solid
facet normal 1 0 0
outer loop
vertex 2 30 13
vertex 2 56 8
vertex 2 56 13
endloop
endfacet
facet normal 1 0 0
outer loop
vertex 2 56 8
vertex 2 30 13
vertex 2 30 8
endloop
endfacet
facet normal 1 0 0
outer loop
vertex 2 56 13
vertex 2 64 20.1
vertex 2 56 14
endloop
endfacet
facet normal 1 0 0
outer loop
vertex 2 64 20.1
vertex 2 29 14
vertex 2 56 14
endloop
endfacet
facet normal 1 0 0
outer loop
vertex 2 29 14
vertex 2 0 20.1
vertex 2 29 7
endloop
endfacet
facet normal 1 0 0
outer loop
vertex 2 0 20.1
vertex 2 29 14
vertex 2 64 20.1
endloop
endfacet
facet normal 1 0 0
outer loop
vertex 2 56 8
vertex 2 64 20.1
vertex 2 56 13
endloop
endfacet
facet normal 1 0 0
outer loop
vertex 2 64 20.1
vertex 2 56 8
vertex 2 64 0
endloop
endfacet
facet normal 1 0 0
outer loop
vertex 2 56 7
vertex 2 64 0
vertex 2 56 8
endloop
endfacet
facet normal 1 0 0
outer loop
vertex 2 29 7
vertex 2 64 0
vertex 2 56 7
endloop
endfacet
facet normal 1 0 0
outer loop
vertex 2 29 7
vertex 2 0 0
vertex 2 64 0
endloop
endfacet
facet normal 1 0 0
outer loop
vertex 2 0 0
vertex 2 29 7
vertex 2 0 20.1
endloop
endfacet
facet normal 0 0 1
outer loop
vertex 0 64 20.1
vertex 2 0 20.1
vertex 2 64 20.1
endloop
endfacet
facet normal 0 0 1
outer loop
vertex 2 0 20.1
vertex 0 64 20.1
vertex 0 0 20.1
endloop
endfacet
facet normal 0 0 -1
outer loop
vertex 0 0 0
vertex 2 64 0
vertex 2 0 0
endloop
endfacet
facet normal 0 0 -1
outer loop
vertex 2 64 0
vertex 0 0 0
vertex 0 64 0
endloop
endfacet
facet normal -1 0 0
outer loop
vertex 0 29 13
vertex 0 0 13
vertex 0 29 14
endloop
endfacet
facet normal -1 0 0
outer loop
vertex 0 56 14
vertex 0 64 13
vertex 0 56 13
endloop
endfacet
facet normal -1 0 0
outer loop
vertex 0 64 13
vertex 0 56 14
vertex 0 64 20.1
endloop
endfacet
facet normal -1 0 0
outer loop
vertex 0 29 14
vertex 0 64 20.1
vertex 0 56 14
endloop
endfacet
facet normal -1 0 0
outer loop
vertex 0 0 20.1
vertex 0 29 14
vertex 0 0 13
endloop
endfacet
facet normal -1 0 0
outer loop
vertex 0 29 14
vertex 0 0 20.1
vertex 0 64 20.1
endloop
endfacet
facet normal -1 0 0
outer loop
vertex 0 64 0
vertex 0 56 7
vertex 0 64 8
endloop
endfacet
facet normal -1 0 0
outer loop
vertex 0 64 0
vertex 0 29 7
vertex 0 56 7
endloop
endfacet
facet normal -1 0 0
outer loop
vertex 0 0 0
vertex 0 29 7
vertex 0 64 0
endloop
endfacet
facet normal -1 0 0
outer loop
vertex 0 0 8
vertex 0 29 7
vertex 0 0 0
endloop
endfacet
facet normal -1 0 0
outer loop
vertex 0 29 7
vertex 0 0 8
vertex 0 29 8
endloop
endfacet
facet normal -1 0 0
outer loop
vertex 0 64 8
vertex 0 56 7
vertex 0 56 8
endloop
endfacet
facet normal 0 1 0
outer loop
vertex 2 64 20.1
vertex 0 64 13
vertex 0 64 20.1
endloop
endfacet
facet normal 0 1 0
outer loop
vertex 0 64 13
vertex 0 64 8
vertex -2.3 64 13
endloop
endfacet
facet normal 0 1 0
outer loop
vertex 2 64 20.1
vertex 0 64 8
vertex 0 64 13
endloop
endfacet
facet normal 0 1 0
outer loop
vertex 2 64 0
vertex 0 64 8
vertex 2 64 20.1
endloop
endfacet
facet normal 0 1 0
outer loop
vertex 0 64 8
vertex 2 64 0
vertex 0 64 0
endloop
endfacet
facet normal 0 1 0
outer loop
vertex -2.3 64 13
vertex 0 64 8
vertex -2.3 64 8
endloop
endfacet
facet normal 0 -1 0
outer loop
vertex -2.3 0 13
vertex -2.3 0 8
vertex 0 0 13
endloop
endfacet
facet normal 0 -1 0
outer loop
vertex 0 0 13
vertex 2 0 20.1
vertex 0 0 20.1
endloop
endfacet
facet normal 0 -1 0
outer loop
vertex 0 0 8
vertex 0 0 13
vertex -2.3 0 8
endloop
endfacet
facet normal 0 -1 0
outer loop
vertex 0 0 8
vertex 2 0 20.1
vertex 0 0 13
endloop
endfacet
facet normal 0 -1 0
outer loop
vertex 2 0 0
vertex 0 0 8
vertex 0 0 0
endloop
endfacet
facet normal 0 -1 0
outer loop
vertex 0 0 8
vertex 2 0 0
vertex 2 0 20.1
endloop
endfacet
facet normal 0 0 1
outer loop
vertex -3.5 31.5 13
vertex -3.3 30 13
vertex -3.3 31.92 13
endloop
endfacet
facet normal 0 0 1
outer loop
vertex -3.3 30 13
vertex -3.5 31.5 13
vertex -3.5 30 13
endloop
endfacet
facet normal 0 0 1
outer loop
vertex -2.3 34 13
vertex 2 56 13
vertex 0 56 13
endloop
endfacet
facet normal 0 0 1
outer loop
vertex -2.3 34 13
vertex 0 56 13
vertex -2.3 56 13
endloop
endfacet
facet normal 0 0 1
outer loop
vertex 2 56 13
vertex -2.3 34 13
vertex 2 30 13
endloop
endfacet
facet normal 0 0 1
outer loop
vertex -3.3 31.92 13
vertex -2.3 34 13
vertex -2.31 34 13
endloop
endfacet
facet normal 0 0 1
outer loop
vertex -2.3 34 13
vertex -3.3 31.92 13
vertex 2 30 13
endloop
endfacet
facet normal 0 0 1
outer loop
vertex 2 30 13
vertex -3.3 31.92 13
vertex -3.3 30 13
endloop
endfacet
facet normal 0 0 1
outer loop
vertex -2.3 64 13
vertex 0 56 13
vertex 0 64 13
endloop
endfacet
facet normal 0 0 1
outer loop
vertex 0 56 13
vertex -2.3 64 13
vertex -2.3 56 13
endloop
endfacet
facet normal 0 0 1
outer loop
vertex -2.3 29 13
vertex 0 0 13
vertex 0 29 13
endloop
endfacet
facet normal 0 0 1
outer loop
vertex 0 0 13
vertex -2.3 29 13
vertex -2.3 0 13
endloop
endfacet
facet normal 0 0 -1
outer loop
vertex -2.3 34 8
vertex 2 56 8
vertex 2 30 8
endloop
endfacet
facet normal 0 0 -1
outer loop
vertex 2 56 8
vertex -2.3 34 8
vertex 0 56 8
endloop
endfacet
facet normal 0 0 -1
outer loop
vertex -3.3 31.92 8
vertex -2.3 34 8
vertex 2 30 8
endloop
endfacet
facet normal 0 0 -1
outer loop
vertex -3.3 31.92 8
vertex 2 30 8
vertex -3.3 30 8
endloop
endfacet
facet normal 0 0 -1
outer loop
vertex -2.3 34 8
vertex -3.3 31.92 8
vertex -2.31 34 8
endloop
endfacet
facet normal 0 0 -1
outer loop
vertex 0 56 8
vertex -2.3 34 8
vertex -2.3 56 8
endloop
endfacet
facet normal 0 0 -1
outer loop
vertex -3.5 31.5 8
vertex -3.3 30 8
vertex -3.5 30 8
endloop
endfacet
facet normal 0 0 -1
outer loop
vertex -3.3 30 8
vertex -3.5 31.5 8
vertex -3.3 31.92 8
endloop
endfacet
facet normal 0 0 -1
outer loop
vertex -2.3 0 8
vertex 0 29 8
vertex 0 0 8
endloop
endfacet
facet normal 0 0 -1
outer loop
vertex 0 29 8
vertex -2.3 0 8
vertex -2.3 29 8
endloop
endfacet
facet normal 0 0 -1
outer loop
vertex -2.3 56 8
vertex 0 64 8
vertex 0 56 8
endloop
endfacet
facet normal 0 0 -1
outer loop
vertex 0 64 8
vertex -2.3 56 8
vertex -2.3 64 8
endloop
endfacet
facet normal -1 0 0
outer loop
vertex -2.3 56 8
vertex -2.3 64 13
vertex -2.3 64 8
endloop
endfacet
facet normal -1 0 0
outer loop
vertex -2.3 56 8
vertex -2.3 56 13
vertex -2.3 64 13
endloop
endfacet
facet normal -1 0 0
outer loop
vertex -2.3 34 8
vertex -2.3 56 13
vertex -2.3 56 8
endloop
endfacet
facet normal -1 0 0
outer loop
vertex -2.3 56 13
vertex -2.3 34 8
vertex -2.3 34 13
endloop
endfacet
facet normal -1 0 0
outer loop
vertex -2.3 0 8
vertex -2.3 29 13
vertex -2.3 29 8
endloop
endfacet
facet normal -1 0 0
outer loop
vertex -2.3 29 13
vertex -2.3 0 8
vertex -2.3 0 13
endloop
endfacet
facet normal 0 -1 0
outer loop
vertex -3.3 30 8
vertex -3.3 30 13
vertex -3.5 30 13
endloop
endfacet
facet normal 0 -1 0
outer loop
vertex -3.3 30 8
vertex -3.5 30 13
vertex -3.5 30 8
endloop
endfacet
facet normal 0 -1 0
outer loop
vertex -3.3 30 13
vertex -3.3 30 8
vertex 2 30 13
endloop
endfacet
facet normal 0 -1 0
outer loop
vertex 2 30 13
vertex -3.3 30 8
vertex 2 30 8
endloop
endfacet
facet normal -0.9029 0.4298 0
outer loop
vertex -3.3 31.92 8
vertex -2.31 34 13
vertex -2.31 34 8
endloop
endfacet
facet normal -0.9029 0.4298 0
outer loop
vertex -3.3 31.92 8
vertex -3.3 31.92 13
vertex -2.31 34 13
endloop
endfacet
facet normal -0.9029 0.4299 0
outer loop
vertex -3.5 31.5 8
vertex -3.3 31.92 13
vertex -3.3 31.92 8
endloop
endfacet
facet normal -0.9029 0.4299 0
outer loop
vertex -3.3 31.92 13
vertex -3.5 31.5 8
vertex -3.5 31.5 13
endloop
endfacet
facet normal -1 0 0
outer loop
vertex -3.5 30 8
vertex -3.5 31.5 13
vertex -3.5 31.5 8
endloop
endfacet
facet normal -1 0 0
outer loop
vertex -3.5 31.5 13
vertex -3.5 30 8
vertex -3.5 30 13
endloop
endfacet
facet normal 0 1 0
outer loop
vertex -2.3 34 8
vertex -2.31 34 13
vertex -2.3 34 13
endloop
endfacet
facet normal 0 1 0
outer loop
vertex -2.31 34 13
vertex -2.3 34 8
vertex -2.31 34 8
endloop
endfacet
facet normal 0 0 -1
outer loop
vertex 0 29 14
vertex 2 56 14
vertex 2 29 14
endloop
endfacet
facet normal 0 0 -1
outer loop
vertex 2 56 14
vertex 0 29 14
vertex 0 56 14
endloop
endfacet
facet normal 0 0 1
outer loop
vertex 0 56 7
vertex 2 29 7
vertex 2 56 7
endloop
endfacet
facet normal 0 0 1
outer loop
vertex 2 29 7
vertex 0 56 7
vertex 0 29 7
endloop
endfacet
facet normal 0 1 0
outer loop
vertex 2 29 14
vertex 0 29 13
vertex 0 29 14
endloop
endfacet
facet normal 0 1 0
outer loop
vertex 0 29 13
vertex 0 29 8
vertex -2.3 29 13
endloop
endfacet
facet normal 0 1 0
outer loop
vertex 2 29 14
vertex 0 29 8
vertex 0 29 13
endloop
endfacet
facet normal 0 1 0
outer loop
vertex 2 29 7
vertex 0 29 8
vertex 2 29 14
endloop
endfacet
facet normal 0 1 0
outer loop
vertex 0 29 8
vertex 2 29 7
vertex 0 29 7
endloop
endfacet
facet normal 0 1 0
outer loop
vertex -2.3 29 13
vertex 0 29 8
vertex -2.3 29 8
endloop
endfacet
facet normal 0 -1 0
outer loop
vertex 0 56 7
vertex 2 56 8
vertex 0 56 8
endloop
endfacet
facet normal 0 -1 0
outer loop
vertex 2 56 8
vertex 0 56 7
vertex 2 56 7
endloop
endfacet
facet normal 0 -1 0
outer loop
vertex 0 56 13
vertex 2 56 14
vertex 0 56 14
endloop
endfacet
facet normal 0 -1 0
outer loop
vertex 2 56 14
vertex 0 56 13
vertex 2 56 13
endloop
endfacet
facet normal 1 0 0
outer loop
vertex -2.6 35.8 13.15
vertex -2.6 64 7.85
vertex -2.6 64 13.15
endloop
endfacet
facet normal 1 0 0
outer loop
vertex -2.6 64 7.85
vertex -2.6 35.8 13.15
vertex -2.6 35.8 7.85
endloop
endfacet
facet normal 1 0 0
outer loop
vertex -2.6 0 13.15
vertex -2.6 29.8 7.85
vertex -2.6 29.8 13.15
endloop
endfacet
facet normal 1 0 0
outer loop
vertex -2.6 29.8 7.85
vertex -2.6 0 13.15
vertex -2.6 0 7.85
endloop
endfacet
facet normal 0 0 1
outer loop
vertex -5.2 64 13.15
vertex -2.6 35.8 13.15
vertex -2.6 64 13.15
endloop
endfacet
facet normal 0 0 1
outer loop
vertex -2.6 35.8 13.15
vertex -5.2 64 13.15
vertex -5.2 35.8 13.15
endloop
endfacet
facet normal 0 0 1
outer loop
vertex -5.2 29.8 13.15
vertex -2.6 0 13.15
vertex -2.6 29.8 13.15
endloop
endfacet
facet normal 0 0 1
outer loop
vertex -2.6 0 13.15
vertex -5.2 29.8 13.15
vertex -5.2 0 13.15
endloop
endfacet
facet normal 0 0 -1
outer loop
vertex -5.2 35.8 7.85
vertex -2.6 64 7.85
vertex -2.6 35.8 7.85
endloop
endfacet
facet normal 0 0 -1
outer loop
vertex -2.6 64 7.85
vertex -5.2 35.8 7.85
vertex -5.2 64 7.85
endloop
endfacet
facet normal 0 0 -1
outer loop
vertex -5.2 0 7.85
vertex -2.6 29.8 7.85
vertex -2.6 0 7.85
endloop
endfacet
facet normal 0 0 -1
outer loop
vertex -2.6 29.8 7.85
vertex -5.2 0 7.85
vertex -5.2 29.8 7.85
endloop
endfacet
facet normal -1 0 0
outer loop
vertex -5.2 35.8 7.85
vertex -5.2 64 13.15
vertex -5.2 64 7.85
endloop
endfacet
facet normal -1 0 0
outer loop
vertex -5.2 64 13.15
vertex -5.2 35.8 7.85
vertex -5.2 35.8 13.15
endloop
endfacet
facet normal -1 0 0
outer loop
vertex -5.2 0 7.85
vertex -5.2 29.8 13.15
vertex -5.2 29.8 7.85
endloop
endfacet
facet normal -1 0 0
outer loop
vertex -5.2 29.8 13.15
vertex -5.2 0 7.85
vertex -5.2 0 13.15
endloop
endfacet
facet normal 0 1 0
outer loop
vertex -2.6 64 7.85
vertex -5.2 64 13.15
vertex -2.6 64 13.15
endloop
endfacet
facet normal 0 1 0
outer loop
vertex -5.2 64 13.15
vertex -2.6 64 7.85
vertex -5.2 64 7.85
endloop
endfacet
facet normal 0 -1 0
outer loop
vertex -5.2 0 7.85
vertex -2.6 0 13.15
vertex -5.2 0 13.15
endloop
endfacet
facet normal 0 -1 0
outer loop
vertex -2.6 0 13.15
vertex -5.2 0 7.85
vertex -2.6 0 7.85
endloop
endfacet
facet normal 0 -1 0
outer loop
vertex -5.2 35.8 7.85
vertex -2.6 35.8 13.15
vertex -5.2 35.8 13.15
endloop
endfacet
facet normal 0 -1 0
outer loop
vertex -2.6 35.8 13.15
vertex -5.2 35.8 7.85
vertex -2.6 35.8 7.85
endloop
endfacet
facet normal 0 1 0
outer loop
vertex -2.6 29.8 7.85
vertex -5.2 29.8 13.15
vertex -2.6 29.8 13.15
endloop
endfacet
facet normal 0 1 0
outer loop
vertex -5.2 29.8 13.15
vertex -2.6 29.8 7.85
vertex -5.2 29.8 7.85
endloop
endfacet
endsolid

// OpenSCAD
// file: _review.scad
// Shared by the review protos: the colours of a before/after pair.  The part in a neutral grey-blue, the
// geometry a proposal changes in the accent, the parts it mates with in a translucent grey.
NEUTRAL = "#b9c6d6";
ACCENT = "#ff7a1a";
MATE = "#6f7782";
MATE_A = 0.45;
PCB = "#2f6f4f";
module part() color(NEUTRAL) children();
module changed() color(ACCENT) children();
module mate(a = MATE_A) color(MATE, a) children();
// main file
// Review proto (not a part): a tray's side wall around its latch arm, seen from outside, with the ladder's
// groove core and its window in front of it (grey, translucent): the barb clicks into that window.  Today:
// arm 26 mm between 1 mm slots with square ends, 1.1 % for the 1.2 mm barb (fine for repeated use), but the
// FEM's 52 MPa sits in the slot's corner.  Proposed (accent): arm 32 mm, the slots' ends R0.5: 0.75 %.
// (OpenCSG preview: the accent piece is drawn as its own geometry, no intersection.)
// docs/printed-parts-review.md › Tray.
//
//   openscad -D 'VIEW="today"' -o latch_arm_today.png mechanical/review/proto/latch_arm.scad
include <_review.scad>
VIEW = "today";
WALL = 2; RUNNER_OUT = 2.3; RZ = [8, 13]; BARB = 1.2; SLOT = 1.0; LY = 30; L = 64; H = 20.1;
CORE = 2.6; CLEAR = 0.2; WIN = 6;
$fn = 24;
RH = RZ[1] - RZ[0];
module barb() translate([-RUNNER_OUT, LY, RZ[0]]) hull() { translate([-0.01, 0, 0]) cube([0.01, 4, RH]); translate([-BARB, 0, 0]) cube([BARB, 1.5, RH]); }
module wall_body() union() {
    cube([WALL, L, H]);
    translate([-RUNNER_OUT, 0, RZ[0]]) cube([RUNNER_OUT + 0.01, L, RH]);
    barb();
}
module slot_y() translate([-RUNNER_OUT - BARB - 1, LY - SLOT, RZ[0] - SLOT]) cube([WALL + RUNNER_OUT + BARB + 2, SLOT, RH + 2 * SLOT]);
module slot_z(arm, r, z) translate([-RUNNER_OUT - 1, LY - SLOT, z])
    if (r <= 0) cube([WALL + RUNNER_OUT + 2, arm + SLOT, SLOT]);
    else hull() for (y = [r, arm + SLOT - r]) translate([0, y, SLOT / 2]) rotate([0, 90, 0]) cylinder(r = r, h = WALL + RUNNER_OUT + 2);
module cuts(arm, r) { slot_y(); slot_z(arm, r, RZ[0] - SLOT); slot_z(arm, r, RZ[1]); }
// the arm itself: the wall strip and the runner strip between the slots, and the barb
module arm_box(arm) translate([-RUNNER_OUT - BARB - 0.5, LY, RZ[0]]) cube([WALL + RUNNER_OUT + BARB + 0.5, arm, RH]);
module arm_piece(arm) { translate([0, LY, RZ[0]]) cube([WALL, arm, RH]); translate([-RUNNER_OUT, LY, RZ[0]]) cube([RUNNER_OUT + 0.01, arm, RH]); barb(); }
// the ladder's groove core (between its two grooves), with the latch window the barb catches in
module groove_core() mate(0.4) translate([-RUNNER_OUT - CLEAR - 0.1 - CORE, 0, RZ[0] - 0.15]) difference() {
    cube([CORE, L, RH + 0.3]);
    translate([-1, LY - 0.2, -1]) cube([CORE + 2, WIN, RH + 2]);
}

if (VIEW == "today") { part() difference() { wall_body(); cuts(26, 0); } groove_core(); }
else {
    part() difference() { wall_body(); cuts(32, 0.5); arm_box(32); }
    changed() arm_piece(32);
    groove_core();
}
